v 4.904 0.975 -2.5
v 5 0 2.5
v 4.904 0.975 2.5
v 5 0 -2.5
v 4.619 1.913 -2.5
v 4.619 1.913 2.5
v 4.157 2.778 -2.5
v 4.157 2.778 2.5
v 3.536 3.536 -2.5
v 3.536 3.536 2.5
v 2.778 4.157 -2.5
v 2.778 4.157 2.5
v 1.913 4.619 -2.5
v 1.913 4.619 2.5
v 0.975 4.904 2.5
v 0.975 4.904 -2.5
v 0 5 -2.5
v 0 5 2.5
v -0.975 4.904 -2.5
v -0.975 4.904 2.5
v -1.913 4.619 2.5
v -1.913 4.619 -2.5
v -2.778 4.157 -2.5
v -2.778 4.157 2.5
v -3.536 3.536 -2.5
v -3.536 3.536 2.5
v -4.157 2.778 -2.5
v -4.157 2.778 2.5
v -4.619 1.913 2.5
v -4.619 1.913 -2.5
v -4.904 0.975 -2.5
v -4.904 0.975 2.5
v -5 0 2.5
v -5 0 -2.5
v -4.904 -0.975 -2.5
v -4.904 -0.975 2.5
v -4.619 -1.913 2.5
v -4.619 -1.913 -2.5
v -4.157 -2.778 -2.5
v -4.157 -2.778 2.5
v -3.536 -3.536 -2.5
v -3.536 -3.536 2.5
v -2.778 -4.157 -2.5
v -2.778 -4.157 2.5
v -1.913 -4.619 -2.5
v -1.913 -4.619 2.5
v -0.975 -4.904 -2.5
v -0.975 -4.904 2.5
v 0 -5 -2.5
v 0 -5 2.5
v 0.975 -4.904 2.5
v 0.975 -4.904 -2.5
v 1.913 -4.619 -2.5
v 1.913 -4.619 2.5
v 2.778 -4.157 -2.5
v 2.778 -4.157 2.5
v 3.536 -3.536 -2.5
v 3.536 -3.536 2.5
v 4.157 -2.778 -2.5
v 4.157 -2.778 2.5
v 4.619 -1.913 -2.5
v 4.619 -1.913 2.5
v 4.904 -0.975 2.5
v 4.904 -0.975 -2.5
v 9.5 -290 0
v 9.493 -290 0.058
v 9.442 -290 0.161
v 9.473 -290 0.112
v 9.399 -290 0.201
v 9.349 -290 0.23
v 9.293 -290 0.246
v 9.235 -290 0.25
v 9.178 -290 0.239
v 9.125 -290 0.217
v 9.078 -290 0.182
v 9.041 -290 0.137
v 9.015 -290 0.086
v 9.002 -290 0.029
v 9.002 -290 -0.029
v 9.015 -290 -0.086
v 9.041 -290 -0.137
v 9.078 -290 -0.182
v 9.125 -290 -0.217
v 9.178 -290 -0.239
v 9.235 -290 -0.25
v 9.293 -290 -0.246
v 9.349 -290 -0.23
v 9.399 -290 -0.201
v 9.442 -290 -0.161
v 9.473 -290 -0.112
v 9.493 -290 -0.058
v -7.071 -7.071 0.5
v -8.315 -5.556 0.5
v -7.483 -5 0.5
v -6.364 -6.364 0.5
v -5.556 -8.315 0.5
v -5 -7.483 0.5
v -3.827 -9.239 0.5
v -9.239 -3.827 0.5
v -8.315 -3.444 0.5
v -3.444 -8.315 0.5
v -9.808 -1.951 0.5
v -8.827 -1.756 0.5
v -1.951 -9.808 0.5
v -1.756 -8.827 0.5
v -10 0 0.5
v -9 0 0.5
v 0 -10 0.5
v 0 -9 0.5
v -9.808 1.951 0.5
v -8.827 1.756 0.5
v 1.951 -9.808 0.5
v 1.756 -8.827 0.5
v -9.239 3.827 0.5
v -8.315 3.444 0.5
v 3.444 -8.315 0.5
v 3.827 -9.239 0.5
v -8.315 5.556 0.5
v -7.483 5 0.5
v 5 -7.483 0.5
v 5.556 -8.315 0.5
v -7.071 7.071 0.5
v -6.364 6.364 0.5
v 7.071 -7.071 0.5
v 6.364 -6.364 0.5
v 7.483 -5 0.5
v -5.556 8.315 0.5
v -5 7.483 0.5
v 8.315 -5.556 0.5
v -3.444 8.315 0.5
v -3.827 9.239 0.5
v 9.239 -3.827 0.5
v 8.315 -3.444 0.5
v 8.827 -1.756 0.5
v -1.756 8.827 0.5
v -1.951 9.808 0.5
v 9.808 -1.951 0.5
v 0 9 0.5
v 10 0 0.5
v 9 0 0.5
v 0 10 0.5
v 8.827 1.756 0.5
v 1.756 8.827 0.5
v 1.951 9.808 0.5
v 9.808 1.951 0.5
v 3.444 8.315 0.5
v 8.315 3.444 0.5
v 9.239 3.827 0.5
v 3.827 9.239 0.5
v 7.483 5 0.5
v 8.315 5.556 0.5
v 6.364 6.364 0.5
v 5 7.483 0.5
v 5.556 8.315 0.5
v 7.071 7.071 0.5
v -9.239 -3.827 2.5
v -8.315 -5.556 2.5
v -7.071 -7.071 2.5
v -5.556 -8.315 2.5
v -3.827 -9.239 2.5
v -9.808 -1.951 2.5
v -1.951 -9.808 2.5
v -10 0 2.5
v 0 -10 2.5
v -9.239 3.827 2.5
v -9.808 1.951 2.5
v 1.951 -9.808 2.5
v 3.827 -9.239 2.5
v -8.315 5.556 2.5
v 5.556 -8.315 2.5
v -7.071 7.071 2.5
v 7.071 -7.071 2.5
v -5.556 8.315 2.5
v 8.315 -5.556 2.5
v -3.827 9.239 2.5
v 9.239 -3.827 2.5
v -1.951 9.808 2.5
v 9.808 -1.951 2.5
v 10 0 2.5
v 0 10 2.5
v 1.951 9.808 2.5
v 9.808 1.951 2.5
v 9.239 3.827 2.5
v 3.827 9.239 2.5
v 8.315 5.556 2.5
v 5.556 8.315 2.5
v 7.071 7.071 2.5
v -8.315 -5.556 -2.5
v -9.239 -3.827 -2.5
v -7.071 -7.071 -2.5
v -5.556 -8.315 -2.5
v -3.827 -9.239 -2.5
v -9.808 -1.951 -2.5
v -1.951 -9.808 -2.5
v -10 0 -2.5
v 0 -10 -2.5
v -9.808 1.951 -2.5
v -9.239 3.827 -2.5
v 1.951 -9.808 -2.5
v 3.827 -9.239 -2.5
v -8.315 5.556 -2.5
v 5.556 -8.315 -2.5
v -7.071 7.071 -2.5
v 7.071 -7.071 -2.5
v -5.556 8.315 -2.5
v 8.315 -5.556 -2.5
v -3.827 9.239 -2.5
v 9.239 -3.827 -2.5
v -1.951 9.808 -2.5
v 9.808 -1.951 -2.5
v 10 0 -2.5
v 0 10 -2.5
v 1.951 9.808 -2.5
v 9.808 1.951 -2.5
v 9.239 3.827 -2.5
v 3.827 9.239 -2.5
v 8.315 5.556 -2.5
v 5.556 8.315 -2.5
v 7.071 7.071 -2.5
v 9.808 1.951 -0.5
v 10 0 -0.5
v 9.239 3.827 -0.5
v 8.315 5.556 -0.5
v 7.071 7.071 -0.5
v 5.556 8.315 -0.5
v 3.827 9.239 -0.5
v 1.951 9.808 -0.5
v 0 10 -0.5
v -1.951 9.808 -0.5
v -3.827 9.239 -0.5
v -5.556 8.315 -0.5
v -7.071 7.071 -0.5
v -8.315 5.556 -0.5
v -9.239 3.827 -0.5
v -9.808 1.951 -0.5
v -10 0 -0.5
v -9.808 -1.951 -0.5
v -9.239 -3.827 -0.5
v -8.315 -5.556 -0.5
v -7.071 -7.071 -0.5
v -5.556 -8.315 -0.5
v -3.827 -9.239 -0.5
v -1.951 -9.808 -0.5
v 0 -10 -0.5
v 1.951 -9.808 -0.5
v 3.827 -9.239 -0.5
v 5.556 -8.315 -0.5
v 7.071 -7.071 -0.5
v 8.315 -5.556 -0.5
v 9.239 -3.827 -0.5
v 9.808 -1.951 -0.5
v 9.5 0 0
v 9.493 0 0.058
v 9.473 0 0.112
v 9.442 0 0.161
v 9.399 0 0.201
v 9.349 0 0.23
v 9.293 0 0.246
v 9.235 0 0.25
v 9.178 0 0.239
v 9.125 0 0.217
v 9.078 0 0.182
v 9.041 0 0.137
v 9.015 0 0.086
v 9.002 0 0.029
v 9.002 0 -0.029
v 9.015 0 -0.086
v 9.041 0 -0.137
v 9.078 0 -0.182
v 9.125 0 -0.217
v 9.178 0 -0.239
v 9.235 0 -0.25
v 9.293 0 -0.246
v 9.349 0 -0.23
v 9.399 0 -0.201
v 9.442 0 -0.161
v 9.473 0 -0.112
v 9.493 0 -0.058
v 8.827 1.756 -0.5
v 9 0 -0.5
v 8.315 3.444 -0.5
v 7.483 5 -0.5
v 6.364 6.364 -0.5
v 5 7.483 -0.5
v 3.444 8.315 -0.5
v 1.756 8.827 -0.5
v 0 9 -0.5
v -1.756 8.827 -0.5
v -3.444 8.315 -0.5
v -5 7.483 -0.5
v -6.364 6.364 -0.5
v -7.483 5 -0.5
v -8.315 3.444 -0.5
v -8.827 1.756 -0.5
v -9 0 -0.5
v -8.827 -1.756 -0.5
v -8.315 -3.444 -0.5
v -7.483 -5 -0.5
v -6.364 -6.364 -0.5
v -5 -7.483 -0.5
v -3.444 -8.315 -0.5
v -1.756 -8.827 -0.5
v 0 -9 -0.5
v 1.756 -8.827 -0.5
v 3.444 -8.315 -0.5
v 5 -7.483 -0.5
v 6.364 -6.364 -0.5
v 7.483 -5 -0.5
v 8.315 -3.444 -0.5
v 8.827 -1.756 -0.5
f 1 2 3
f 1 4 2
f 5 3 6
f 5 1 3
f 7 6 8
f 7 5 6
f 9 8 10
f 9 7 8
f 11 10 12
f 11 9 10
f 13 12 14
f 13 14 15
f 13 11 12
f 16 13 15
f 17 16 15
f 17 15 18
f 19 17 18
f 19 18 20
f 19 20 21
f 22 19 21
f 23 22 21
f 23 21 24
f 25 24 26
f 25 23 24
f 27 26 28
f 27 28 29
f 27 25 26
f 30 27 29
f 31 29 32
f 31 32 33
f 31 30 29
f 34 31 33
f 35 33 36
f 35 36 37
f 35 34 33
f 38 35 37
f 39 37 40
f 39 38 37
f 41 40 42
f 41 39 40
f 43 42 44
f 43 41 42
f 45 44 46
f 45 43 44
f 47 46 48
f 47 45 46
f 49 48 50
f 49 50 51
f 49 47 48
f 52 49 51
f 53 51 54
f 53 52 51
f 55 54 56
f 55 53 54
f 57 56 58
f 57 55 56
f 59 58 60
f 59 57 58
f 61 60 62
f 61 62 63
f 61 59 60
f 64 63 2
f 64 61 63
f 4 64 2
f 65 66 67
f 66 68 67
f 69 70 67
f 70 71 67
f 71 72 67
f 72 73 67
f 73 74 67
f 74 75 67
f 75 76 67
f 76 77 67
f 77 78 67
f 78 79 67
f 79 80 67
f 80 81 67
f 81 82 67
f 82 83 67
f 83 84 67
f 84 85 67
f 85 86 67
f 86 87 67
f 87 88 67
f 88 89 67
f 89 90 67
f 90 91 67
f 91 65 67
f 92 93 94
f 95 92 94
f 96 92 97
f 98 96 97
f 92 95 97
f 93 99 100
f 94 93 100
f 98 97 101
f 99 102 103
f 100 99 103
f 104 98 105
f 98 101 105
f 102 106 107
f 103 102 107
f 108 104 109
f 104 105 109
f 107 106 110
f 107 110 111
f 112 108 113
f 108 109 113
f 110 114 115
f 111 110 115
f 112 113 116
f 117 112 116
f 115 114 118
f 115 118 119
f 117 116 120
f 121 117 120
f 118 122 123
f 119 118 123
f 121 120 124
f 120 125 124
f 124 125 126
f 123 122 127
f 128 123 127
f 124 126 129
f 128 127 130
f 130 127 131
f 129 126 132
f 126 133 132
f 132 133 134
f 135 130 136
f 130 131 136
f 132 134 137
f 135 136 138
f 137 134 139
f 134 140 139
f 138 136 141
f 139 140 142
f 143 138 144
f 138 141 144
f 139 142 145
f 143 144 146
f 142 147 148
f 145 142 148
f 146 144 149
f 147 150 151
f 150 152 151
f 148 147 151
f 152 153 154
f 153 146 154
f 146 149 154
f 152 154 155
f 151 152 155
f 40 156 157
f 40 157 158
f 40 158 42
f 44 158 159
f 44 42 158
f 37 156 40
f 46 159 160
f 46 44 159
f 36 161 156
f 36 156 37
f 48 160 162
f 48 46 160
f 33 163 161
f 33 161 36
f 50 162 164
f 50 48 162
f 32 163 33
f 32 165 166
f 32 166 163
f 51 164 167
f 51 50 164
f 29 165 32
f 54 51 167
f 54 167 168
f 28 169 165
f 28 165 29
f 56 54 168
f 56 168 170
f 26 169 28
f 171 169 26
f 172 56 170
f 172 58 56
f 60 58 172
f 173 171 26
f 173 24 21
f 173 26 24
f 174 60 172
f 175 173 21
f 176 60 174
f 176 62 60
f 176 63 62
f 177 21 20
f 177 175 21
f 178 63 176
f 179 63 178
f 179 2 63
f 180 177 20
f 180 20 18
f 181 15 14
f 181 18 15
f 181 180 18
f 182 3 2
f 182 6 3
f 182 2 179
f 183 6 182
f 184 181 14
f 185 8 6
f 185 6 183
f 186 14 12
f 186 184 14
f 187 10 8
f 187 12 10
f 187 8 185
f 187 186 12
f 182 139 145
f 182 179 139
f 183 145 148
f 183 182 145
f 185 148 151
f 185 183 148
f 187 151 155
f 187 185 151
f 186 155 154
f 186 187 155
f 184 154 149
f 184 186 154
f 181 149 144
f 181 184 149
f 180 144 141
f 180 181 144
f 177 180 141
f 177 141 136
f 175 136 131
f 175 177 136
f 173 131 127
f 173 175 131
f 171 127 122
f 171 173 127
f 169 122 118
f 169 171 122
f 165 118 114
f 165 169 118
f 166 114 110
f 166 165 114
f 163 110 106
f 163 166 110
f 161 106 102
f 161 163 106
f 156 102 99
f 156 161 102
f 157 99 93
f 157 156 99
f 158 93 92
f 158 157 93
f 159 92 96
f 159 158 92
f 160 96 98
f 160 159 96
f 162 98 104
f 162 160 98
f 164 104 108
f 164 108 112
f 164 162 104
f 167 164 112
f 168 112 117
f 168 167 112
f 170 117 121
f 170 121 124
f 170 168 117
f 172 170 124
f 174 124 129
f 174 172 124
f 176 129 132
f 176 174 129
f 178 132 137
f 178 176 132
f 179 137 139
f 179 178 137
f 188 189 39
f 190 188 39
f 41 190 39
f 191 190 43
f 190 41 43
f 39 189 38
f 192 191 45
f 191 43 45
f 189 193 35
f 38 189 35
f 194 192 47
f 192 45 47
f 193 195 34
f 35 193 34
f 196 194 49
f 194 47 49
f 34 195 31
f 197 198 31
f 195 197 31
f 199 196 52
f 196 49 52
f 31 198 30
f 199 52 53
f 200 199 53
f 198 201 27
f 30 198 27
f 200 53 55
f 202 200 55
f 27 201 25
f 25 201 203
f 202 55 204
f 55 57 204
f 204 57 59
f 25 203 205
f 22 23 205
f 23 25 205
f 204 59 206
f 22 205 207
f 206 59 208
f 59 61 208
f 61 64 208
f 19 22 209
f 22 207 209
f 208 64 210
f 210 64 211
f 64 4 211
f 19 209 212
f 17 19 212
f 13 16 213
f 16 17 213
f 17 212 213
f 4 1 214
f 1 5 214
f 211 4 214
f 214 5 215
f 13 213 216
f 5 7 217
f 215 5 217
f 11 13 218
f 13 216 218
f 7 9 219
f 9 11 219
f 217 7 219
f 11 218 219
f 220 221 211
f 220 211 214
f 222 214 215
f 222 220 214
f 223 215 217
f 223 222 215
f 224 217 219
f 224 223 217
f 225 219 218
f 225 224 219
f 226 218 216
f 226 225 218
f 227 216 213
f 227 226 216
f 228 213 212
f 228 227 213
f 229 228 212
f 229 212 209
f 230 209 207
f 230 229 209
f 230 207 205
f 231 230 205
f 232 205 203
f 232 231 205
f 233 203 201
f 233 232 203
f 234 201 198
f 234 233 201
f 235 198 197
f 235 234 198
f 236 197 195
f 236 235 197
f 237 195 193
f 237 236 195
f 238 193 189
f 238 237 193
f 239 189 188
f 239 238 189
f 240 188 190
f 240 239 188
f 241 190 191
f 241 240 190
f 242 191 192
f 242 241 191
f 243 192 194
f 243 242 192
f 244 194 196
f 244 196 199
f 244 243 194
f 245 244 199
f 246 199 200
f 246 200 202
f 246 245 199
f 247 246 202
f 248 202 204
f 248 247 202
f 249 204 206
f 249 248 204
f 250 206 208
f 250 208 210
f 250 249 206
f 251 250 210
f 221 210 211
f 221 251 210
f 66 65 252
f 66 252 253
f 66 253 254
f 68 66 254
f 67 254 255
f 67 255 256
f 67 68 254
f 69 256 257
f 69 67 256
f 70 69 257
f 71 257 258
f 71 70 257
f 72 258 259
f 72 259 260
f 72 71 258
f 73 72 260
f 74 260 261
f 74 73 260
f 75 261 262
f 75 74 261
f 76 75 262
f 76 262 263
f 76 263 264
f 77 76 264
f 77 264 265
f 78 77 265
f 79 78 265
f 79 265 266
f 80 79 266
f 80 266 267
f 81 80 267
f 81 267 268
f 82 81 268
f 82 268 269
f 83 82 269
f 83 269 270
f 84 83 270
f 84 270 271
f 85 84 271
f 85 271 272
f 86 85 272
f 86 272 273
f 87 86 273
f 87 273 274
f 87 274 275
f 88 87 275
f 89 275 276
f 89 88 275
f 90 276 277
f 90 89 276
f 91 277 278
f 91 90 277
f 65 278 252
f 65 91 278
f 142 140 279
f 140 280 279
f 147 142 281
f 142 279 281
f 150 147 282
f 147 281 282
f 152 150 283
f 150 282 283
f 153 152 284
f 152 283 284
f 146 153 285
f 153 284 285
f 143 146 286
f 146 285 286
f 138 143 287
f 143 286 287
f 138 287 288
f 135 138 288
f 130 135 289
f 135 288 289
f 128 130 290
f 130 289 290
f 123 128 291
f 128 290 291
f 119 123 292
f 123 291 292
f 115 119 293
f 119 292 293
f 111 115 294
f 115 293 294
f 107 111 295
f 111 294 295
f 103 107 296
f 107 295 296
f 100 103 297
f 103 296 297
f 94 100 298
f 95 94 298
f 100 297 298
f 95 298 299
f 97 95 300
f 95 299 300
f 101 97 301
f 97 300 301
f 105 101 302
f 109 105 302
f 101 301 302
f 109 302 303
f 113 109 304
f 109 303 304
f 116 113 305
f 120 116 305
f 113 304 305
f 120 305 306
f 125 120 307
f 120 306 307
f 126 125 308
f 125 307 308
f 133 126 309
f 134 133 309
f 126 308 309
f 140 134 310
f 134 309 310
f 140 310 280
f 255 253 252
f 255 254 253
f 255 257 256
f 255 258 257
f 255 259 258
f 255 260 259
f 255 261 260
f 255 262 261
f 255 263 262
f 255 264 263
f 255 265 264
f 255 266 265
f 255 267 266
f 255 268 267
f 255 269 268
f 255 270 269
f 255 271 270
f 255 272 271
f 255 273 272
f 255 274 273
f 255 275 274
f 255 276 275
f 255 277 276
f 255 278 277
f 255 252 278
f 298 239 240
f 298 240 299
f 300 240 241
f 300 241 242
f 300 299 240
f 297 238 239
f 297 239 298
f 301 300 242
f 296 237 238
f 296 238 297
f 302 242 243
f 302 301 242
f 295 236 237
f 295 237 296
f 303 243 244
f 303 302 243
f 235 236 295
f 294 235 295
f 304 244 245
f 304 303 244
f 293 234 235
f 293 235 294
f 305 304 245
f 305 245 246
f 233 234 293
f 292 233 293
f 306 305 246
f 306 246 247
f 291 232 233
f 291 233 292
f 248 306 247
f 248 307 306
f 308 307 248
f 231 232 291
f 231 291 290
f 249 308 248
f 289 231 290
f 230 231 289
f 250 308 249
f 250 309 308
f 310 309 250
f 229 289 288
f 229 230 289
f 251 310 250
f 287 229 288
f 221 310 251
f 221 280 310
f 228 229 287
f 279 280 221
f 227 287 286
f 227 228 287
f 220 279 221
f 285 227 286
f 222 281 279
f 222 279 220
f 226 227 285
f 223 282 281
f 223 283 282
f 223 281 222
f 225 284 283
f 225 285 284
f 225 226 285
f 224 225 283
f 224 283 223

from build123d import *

# Parameters (mm, degrees)
SKETCH1_R           = 10
SKETCH1_R_2         = 5
BOSS_EXTRUDE1_DEPTH = 2.5
SKETCH2_R           = 10
SKETCH2_R_2         = 9
CUT_EXTRUDE1_DEPTH  = 0.5
SKETCH4_R           = 0.25


with BuildPart() as part:
    # Sketch1 → Boss-Extrude1 (new body, symmetric)
    with BuildSketch(Plane.XY):
        Circle(SKETCH1_R)
        Circle(SKETCH1_R_2, mode=Mode.SUBTRACT)
    extrude(amount=BOSS_EXTRUDE1_DEPTH, both=True)

    # Sketch2 → Cut-Extrude1 (cut, symmetric)
    with BuildSketch(Plane.XY):
        Circle(SKETCH2_R)
        Circle(SKETCH2_R_2, mode=Mode.SUBTRACT)
    extrude(amount=CUT_EXTRUDE1_DEPTH, both=True, mode=Mode.SUBTRACT)


with BuildPart() as body_2:
    # Sweep1: sweep along a path in Sketch3
    with BuildLine(Plane.XY) as sweep1_path:
        Line((9.25, 0), (9.25, -290))
    # Sketch4 → Sweep1 (sweep)
    with BuildSketch(Plane(origin=(0, 0, 0), x_dir=(1, 0, 0), z_dir=(0, 1, 0))):
        with Locations((9.25, 0)):
            Circle(SKETCH4_R)
    sweep(path=sweep1_path.line)


solid = Compound([part.part, body_2.part])
